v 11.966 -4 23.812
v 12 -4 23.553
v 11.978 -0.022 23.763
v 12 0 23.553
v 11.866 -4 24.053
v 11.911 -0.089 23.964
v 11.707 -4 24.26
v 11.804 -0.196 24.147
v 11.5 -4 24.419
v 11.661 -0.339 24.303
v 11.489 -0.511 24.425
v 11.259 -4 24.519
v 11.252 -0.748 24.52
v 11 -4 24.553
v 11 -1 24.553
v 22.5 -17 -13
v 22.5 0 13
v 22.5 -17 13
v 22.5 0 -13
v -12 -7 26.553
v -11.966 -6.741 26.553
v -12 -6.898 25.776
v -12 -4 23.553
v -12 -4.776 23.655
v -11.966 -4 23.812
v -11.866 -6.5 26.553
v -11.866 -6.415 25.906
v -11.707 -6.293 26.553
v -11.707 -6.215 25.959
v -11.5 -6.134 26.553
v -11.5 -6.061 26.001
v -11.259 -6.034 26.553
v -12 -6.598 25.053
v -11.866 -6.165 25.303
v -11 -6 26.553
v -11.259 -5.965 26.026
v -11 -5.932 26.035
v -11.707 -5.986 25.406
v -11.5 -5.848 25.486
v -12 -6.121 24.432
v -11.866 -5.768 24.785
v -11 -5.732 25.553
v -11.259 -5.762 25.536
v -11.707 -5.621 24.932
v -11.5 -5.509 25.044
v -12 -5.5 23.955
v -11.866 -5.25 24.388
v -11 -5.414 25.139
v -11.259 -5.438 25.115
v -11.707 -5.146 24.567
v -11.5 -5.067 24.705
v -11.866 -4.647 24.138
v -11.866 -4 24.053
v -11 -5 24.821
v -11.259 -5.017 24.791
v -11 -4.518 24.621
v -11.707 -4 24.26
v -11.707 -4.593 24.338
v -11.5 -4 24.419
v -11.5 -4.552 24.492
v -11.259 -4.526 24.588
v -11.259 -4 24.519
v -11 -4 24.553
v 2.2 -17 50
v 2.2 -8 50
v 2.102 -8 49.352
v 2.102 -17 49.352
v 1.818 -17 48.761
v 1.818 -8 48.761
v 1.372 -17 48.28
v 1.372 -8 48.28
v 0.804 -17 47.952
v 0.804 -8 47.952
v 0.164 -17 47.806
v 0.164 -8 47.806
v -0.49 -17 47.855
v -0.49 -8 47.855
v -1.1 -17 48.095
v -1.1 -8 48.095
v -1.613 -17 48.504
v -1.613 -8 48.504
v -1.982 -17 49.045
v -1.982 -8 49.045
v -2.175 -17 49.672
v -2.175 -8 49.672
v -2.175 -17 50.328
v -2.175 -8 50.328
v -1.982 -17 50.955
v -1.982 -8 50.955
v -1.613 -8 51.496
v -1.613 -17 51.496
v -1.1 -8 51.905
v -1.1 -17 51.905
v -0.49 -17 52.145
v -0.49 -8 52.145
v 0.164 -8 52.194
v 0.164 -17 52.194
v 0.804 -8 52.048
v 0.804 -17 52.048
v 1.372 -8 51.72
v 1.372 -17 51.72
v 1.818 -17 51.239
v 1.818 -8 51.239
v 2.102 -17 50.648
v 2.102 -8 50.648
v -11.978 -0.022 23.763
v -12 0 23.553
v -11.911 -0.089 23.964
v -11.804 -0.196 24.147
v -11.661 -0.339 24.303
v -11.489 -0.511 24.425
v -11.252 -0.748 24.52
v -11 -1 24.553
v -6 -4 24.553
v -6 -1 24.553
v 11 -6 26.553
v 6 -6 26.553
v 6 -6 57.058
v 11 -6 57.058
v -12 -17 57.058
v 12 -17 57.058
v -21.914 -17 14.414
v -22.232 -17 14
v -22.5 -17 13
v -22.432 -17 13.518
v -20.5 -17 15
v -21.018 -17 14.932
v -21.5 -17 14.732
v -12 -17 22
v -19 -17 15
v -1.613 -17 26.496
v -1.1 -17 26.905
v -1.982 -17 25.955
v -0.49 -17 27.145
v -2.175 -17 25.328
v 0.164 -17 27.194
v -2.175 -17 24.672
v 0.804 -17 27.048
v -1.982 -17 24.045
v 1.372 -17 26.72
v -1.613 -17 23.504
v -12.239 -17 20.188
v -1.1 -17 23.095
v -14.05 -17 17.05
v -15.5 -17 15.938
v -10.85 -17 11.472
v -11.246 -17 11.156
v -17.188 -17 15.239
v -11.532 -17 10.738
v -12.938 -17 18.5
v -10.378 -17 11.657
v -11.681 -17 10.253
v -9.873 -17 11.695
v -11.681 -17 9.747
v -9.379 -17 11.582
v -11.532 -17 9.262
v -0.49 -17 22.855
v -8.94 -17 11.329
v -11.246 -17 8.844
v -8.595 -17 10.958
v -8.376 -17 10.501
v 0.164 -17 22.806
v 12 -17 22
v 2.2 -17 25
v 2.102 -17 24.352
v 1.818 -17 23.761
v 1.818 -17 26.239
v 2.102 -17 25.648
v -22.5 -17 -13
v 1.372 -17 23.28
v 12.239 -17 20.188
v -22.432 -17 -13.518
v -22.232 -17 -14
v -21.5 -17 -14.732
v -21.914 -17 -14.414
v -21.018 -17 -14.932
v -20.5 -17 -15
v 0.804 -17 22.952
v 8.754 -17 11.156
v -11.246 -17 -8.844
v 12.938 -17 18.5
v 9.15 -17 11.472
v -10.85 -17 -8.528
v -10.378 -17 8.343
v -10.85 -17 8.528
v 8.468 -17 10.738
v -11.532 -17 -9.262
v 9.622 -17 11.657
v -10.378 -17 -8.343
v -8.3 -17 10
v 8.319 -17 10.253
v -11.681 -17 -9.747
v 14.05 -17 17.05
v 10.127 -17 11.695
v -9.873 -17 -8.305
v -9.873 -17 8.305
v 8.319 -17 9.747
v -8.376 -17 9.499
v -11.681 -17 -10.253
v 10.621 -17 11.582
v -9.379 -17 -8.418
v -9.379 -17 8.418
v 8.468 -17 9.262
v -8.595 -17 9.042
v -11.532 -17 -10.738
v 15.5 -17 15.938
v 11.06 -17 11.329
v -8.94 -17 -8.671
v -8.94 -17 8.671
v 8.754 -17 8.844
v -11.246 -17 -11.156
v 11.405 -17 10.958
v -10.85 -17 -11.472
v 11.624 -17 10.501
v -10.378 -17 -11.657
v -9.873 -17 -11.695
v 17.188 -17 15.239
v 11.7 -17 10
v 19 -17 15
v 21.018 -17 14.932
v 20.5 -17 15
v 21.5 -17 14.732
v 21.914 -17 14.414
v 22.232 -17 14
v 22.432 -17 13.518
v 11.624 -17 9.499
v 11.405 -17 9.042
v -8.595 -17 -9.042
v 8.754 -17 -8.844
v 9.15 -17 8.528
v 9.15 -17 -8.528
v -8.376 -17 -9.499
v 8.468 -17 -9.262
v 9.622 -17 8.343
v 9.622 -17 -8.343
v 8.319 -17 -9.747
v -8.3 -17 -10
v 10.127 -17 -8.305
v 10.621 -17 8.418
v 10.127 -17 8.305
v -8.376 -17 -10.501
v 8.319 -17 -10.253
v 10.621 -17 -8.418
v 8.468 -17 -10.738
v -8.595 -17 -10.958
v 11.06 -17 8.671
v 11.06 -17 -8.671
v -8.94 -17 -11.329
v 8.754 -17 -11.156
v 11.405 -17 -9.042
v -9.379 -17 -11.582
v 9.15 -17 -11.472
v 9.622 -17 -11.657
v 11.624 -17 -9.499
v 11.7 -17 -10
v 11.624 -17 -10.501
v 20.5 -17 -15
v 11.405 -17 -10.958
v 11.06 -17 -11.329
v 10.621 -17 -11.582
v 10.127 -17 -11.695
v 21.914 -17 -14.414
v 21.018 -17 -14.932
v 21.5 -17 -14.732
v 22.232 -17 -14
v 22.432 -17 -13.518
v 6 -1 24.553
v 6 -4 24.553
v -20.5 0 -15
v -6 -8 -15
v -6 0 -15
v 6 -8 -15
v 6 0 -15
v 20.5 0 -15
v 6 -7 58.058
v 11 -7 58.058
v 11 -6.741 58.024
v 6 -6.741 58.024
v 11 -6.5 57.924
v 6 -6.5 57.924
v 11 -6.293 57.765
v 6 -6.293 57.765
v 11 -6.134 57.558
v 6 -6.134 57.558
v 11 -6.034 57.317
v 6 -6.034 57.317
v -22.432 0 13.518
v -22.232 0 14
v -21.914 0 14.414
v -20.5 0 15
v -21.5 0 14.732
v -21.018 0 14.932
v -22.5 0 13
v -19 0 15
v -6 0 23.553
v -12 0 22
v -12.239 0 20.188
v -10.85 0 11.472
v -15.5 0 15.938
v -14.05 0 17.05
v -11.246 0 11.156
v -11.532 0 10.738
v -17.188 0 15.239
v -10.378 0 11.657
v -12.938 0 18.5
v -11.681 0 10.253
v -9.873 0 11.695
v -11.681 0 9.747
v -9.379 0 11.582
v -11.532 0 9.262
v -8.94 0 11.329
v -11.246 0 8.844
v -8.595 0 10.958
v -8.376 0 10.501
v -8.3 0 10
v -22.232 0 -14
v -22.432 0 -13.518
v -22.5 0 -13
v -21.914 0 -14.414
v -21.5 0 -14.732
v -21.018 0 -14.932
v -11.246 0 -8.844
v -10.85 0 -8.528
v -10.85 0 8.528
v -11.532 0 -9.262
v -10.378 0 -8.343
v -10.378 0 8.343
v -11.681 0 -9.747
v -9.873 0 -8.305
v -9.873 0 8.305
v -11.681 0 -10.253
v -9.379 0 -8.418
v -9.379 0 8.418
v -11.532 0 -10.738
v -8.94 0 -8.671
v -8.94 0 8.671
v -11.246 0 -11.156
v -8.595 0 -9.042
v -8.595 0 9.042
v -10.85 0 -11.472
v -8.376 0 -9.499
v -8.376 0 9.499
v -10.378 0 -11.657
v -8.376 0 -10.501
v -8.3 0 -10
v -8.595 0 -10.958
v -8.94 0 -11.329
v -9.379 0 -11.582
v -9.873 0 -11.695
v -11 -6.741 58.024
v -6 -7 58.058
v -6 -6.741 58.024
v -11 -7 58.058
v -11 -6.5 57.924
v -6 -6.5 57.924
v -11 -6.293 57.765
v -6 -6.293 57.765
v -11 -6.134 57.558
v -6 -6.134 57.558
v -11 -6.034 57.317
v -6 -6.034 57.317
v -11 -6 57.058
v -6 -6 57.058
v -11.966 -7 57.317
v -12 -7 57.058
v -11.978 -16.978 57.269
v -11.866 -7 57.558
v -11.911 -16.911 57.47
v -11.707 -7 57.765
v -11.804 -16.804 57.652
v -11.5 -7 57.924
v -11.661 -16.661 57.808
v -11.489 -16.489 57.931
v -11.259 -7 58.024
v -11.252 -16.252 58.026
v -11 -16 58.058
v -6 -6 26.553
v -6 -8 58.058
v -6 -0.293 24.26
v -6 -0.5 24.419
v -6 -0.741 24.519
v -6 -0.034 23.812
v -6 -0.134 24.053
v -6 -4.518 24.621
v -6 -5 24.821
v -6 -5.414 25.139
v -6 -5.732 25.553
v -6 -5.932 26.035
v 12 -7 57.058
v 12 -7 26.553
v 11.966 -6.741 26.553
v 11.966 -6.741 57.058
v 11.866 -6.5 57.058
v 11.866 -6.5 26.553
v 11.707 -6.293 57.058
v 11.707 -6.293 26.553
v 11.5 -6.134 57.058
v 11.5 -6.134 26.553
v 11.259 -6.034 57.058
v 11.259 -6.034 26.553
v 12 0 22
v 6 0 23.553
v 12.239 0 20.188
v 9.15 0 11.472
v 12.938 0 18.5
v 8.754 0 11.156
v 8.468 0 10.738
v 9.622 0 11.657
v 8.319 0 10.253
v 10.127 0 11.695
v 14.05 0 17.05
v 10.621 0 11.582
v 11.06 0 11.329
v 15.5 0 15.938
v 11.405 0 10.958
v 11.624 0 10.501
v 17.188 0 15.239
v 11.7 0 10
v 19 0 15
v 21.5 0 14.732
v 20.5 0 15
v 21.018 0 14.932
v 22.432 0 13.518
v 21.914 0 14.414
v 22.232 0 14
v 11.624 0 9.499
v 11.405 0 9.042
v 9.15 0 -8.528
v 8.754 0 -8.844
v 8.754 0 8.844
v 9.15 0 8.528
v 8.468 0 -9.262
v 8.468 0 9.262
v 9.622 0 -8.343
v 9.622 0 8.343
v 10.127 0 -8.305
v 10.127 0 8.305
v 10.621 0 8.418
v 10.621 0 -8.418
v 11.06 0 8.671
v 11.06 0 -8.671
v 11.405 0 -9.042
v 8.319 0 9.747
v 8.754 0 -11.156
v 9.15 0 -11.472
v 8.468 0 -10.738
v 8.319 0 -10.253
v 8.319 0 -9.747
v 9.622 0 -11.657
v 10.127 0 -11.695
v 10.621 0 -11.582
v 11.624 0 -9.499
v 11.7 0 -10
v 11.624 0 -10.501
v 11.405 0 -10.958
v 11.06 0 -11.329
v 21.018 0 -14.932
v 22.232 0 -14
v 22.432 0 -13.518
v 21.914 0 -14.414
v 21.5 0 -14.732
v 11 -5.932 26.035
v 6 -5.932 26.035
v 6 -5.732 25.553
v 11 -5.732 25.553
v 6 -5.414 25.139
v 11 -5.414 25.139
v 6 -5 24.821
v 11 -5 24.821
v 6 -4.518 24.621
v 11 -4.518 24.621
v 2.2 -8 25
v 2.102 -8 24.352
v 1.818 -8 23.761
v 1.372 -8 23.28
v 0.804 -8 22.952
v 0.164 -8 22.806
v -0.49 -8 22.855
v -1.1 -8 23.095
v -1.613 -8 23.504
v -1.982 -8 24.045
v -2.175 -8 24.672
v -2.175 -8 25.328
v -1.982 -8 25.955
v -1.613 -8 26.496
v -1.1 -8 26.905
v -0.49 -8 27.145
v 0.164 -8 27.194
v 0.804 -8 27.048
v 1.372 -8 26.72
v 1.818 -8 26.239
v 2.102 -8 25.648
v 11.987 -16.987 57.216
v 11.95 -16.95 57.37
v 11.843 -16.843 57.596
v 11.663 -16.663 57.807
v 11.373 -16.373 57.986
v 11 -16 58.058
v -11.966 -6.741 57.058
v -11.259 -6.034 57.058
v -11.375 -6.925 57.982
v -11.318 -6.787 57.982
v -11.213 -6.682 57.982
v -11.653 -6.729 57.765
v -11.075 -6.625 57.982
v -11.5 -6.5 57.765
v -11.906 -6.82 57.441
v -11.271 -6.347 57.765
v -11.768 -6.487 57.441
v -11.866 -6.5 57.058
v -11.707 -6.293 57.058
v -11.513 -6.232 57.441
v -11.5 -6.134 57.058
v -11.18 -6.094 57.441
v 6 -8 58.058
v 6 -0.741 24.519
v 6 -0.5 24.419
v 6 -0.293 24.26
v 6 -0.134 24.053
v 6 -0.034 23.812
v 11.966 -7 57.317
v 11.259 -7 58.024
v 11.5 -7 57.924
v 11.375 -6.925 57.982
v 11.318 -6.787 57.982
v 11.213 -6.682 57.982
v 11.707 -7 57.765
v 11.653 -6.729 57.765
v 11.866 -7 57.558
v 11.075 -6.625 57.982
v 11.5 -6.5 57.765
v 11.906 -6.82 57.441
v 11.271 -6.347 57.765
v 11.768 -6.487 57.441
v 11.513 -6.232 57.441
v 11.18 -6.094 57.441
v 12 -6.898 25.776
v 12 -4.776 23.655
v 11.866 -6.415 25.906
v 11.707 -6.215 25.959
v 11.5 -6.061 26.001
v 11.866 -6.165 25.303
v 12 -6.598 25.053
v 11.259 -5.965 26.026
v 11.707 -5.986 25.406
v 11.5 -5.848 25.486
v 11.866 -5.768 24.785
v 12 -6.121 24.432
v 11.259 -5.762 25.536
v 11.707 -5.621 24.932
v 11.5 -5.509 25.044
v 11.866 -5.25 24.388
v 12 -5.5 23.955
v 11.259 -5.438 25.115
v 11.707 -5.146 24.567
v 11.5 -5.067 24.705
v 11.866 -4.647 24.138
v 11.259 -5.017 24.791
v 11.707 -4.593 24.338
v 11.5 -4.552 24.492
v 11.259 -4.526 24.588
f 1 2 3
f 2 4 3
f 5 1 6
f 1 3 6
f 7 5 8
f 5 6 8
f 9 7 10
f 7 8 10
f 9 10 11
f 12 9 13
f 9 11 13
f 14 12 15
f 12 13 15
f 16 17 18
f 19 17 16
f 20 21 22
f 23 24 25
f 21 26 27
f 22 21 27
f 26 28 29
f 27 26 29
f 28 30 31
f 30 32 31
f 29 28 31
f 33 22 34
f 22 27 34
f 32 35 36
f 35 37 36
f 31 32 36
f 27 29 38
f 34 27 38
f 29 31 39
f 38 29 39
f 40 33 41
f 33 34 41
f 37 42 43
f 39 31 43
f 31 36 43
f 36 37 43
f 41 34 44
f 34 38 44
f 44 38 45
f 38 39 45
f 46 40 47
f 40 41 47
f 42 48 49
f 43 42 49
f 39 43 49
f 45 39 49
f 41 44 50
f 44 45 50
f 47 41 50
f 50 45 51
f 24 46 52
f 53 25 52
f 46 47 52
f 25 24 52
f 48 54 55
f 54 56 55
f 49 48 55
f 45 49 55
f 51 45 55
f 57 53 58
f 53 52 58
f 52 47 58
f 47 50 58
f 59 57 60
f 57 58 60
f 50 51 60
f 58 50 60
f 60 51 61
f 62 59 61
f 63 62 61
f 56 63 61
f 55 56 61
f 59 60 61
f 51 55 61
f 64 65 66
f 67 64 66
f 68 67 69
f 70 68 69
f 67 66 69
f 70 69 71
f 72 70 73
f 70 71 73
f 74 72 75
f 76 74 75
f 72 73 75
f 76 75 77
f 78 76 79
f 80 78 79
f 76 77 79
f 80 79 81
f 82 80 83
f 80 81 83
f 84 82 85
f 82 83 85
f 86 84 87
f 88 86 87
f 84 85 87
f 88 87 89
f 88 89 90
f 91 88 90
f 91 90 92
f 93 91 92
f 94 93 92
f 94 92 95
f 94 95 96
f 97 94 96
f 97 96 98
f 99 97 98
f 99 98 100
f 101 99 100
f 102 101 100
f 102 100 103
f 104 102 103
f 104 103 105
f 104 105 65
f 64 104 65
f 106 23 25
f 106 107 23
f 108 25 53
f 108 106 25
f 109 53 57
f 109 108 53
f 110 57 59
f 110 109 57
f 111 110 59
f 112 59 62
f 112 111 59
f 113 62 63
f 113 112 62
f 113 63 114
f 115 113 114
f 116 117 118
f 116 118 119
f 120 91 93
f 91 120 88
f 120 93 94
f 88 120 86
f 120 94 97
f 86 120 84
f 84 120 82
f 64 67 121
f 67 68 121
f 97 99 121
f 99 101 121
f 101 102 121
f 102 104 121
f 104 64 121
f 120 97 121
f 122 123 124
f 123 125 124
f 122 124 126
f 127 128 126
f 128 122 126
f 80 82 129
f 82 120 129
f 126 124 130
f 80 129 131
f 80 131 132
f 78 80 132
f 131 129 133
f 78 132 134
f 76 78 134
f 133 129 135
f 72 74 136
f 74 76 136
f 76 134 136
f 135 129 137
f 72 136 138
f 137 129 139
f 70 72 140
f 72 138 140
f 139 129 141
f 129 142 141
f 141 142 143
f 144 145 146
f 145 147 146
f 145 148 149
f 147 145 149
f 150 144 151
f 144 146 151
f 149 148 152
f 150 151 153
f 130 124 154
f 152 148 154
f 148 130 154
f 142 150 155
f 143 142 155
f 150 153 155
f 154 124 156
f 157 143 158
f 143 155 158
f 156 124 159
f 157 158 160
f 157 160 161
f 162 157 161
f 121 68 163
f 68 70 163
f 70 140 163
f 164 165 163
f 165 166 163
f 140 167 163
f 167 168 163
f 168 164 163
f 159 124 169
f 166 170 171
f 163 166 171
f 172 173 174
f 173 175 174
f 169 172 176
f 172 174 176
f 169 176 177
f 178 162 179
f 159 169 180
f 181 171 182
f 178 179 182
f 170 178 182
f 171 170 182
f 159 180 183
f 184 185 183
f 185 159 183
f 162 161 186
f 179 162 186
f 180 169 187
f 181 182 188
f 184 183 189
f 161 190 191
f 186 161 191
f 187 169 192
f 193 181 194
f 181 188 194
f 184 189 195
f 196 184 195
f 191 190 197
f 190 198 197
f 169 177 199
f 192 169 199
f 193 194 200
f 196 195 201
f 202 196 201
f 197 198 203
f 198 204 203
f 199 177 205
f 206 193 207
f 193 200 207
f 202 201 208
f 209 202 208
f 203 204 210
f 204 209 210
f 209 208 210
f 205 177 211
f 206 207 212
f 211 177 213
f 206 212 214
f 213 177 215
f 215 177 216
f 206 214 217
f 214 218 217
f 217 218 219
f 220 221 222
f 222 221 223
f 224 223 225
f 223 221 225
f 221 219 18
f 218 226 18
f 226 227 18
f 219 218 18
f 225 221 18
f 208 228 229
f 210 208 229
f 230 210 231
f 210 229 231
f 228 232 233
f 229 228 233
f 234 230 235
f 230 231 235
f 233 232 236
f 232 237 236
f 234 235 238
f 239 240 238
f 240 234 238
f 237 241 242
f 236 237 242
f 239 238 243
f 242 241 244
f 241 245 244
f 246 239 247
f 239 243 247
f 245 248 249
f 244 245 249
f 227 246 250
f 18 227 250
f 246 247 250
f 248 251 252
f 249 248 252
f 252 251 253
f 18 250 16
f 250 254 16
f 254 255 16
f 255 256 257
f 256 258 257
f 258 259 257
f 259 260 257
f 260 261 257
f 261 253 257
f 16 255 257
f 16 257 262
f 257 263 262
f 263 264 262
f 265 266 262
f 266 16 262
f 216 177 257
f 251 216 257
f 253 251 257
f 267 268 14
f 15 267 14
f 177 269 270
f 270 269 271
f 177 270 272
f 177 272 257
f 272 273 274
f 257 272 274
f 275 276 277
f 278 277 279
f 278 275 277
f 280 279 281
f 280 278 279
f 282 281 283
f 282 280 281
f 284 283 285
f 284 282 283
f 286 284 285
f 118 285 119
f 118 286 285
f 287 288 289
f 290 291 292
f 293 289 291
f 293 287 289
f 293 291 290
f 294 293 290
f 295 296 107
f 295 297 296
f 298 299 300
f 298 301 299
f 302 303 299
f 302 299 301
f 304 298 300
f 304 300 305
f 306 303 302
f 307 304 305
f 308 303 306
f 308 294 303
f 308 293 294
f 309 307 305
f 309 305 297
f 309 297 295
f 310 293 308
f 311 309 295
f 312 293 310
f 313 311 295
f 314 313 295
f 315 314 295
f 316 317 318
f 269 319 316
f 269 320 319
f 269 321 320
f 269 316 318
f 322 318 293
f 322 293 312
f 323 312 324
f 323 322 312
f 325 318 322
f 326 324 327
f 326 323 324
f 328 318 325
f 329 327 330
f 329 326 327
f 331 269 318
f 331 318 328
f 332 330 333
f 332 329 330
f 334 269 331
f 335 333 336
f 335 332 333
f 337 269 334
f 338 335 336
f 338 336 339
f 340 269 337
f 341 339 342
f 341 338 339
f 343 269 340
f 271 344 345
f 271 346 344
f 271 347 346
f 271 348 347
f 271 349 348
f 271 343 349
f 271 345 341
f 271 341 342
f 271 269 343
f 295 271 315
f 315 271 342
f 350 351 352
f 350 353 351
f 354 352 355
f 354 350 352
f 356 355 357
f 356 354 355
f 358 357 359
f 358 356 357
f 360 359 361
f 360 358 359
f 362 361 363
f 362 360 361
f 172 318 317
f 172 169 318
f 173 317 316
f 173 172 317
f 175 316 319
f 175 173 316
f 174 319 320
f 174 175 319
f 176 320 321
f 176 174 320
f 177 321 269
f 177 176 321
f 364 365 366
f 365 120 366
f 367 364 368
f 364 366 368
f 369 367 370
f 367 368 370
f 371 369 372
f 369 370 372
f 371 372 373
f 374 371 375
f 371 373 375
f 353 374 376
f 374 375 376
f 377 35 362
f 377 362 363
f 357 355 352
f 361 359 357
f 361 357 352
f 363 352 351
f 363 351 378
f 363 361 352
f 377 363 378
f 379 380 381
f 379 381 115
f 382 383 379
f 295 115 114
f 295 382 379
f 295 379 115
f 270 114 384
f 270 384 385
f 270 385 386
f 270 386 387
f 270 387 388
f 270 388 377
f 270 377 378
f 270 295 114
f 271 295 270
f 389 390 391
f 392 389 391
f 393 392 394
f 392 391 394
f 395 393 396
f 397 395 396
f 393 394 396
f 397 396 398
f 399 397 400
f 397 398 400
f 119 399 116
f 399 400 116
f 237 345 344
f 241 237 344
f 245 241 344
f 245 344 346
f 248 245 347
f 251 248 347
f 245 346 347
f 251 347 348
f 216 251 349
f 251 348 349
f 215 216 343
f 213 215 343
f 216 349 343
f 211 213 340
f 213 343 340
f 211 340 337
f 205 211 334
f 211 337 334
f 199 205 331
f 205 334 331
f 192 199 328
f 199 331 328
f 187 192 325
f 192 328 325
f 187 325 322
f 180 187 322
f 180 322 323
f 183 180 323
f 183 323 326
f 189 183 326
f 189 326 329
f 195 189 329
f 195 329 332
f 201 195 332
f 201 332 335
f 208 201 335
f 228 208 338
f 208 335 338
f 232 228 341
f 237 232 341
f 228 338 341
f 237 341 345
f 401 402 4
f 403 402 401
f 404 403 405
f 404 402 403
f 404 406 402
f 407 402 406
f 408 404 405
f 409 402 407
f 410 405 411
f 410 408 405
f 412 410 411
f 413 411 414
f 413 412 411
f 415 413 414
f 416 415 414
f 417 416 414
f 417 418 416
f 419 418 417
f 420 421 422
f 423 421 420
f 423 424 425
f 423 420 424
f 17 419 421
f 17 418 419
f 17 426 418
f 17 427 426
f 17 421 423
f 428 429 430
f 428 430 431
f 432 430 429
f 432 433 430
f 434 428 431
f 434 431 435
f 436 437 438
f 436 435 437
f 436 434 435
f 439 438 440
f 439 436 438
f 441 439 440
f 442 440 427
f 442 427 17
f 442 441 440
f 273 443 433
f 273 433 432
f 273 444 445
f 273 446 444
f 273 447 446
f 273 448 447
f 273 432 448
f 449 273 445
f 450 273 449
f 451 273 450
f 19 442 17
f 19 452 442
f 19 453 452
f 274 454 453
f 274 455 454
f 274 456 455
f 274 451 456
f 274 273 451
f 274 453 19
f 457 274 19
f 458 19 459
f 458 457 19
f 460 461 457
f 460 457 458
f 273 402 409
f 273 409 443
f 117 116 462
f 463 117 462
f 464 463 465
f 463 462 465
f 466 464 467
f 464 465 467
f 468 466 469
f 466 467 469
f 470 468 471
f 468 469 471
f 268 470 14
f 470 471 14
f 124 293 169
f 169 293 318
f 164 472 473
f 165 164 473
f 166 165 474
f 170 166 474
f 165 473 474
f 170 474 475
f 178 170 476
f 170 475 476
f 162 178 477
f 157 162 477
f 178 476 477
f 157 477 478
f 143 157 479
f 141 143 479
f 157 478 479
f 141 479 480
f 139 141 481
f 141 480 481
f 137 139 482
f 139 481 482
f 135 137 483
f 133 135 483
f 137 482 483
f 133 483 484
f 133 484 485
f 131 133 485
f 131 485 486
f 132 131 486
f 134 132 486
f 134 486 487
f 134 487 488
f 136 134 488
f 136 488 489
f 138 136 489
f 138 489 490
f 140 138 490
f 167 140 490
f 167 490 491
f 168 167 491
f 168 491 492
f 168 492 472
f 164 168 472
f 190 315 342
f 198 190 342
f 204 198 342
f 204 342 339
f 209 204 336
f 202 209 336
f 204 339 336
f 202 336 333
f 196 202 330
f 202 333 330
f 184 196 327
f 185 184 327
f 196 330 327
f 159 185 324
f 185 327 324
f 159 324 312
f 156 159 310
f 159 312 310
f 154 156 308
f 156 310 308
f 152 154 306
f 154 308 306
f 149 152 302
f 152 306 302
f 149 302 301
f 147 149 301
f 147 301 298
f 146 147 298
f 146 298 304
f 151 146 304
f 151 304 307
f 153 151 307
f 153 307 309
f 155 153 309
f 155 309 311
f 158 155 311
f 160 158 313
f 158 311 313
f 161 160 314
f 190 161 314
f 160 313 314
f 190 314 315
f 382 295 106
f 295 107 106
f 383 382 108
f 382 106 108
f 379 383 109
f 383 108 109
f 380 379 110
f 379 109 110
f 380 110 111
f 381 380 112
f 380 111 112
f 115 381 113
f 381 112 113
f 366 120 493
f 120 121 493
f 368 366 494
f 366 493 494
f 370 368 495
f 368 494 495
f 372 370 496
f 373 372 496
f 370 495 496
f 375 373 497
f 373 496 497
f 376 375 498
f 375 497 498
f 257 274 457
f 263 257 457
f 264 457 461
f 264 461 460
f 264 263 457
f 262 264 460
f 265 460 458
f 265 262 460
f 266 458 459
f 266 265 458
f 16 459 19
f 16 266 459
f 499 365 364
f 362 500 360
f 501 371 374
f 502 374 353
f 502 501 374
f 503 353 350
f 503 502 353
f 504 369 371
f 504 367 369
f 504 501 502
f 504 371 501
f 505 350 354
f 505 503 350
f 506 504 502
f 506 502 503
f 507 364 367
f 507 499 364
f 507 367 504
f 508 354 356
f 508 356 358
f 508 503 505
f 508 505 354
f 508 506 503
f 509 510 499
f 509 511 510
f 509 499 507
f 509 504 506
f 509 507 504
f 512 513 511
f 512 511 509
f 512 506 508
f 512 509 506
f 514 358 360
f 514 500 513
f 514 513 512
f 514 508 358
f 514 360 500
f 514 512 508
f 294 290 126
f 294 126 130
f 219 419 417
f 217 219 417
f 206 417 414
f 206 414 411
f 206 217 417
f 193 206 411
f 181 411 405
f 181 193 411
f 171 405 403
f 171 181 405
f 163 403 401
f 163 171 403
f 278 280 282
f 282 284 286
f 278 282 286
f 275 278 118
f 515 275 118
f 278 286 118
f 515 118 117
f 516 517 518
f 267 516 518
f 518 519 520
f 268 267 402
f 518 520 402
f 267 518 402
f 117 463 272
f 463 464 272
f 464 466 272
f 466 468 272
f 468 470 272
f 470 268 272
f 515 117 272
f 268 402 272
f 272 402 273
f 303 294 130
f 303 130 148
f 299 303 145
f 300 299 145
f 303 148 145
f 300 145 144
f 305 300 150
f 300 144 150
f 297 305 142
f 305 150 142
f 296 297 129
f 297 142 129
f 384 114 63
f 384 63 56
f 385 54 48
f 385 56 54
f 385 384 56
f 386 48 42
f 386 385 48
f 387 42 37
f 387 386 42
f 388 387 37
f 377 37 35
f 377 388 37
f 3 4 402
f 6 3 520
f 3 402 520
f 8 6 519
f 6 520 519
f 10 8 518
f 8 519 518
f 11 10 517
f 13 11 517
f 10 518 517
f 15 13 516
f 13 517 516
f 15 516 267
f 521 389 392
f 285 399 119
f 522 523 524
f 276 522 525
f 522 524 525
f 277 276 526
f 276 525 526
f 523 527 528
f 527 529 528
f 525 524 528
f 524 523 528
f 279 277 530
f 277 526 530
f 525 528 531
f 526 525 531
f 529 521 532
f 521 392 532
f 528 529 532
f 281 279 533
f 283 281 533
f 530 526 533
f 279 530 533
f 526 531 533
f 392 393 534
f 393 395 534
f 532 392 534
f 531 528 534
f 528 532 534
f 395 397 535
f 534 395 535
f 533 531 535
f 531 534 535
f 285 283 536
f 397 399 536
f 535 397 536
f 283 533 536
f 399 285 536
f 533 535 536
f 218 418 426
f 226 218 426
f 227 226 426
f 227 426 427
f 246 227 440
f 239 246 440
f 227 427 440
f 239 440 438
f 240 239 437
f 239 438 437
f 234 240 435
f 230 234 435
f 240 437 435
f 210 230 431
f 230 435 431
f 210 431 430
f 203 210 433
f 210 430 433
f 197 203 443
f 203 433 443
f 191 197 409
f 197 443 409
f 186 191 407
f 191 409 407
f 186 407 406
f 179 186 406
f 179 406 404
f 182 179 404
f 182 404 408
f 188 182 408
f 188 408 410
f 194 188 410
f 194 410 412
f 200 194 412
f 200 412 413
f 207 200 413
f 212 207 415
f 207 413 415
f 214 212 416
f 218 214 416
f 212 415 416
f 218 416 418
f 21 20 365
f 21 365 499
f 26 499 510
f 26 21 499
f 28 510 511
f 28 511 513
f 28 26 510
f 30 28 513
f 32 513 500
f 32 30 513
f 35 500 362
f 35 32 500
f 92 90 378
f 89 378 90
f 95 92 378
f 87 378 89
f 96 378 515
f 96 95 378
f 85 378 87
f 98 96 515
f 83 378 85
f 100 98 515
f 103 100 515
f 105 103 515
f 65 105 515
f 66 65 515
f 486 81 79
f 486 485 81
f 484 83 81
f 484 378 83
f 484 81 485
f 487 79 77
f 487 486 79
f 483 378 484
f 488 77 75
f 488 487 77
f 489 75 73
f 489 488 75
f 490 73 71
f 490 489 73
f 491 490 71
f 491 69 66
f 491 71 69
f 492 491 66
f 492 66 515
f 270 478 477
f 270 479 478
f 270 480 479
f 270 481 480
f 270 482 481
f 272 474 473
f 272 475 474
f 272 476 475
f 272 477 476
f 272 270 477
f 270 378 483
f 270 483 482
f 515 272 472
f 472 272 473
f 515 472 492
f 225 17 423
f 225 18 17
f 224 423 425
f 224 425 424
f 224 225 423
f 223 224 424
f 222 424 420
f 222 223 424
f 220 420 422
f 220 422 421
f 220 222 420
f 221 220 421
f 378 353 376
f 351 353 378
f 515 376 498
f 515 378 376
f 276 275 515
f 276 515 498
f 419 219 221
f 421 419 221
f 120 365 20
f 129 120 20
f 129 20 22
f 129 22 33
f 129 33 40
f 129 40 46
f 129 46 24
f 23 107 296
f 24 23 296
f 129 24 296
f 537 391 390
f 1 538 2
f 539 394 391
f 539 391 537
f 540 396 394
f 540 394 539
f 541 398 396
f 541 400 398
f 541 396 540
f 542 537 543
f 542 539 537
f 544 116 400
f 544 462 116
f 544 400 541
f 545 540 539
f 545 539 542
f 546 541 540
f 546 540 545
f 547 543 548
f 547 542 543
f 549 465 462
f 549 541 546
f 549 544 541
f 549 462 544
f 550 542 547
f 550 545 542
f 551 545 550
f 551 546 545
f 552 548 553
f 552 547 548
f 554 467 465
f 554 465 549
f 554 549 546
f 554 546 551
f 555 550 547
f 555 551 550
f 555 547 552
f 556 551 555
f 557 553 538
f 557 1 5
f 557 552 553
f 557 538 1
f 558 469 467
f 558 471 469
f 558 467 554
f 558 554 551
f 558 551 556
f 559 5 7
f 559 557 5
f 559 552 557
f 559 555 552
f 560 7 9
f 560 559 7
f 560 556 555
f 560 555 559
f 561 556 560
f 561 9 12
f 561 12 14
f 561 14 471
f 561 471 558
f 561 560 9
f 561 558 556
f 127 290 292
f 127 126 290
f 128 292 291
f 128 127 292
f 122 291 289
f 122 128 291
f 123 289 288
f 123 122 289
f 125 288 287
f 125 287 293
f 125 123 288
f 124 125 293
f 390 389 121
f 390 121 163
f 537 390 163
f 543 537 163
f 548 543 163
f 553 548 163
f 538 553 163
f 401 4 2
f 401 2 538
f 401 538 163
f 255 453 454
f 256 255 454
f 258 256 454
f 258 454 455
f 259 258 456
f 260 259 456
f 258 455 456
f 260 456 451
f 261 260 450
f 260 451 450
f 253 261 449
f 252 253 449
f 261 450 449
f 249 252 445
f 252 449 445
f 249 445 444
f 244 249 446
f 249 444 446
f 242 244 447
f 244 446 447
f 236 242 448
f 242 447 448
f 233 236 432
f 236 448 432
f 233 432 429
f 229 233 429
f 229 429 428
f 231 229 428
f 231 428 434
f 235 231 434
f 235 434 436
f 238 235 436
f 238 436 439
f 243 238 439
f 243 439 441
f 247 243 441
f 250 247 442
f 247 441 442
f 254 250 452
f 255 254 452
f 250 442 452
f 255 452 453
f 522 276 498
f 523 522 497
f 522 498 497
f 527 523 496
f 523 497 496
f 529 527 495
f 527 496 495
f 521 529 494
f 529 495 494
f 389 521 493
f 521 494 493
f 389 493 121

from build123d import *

# Parameters (mm, degrees)
SKETCH1_W           = 45
SKETCH1_H           = 30
SKETCH1_R           = 1.7
SKETCH1_W_2         = 24
SKETCH1_H_2         = 43.058371989
SKETCH1_R_2         = 2.2
BOSS_EXTRUDE2_DEPTH = 17
SKETCH5_W           = 12
SKETCH5_H           = 100
CUT_EXTRUDE1_DEPTH  = 8
SKETCH7_W           = 29.697028674
SKETCH7_H           = 34.988499238
CUT_EXTRUDE2_DEPTH  = 7
FILLET1_R           = 7
FILLET6_R           = 2
FILLET7_R           = 1


with BuildPart() as part:
    # Sketch1 → Boss-Extrude2 (new body)
    with BuildSketch(Plane(origin=(0, 0, 0), x_dir=(1, 0, 0), z_dir=(0, 1, 0))):
        Rectangle(SKETCH1_W, SKETCH1_H)
        with Locations((-10, 10)):
            Circle(SKETCH1_R, mode=Mode.SUBTRACT)
        with Locations((10, 10)):
            Circle(SKETCH1_R, mode=Mode.SUBTRACT)
        with Locations((10, -10)):
            Circle(SKETCH1_R, mode=Mode.SUBTRACT)
        with Locations((-10, -10)):
            Circle(SKETCH1_R, mode=Mode.SUBTRACT)
        with Locations((0, -36.529185995)):
            Rectangle(SKETCH1_W_2, SKETCH1_H_2)
        with Locations((0, -25)):
            Circle(SKETCH1_R_2, mode=Mode.SUBTRACT)
        with Locations((0, -50)):
            Circle(SKETCH1_R_2, mode=Mode.SUBTRACT)
    extrude(amount=-BOSS_EXTRUDE2_DEPTH)

    # Sketch5 → Cut-Extrude1 (cut)
    with BuildSketch(Plane(origin=(0, 0, 0), x_dir=(1, 0, 0), z_dir=(0, 1, 0))):
        with Locations((0, -16.465194583)):
            Rectangle(SKETCH5_W, SKETCH5_H)
    extrude(amount=-CUT_EXTRUDE1_DEPTH, mode=Mode.SUBTRACT)

    # Sketch7 → Cut-Extrude2 (cut, through all)
    with BuildSketch(Plane(origin=(0, -6, 0), x_dir=(1, 0, 0), z_dir=(0, 1, 0))):
        with Locations((-0.809918964, -42.047133079)):
            Rectangle(SKETCH7_W, SKETCH7_H)
    extrude(amount=CUT_EXTRUDE2_DEPTH, mode=Mode.SUBTRACT)

    # Fillet1
    fillet1_edges = [part.edges().sort_by_distance(p)[0] for p in [
        (-12, -8.5, 15),
        (12, -8.5, 15),
    ]]
    fillet(fillet1_edges, radius=FILLET1_R)

    # Fillet6
    fillet6_edges = [part.edges().sort_by_distance(p)[0] for p in [
        (22.5, -8.5, 15),
        (-22.5, -8.5, 15),
        (-22.5, -8.5, -15),
        (22.5, -8.5, -15),
        (9, -6, 24.55288346),
        (-9, -6, 24.55288346),
    ]]
    fillet(fillet6_edges, radius=FILLET6_R)

    # Fillet7
    fillet7_edges = [part.edges().sort_by_distance(p)[0] for p in [
        (-12, -2, 24.55288346),
        (12, -2, 24.55288346),
        (-12, -5.414213562, 25.138669897),
        (12, -5.414213562, 25.138669897),
        (-12, -11.5, 58.058371989),
        (12, -11.5, 58.058371989),
        (0, -17, 58.058371989),
        (9, 0, 24.55288346),
        (9, -6, 58.058371989),
        (12, -6, 42.305627724),
        (-9, 0, 24.55288346),
        (-9, -6, 58.058371989),
        (-12, -6, 42.305627724),
    ]]
    fillet(fillet7_edges, radius=FILLET7_R)


solid = part.part
